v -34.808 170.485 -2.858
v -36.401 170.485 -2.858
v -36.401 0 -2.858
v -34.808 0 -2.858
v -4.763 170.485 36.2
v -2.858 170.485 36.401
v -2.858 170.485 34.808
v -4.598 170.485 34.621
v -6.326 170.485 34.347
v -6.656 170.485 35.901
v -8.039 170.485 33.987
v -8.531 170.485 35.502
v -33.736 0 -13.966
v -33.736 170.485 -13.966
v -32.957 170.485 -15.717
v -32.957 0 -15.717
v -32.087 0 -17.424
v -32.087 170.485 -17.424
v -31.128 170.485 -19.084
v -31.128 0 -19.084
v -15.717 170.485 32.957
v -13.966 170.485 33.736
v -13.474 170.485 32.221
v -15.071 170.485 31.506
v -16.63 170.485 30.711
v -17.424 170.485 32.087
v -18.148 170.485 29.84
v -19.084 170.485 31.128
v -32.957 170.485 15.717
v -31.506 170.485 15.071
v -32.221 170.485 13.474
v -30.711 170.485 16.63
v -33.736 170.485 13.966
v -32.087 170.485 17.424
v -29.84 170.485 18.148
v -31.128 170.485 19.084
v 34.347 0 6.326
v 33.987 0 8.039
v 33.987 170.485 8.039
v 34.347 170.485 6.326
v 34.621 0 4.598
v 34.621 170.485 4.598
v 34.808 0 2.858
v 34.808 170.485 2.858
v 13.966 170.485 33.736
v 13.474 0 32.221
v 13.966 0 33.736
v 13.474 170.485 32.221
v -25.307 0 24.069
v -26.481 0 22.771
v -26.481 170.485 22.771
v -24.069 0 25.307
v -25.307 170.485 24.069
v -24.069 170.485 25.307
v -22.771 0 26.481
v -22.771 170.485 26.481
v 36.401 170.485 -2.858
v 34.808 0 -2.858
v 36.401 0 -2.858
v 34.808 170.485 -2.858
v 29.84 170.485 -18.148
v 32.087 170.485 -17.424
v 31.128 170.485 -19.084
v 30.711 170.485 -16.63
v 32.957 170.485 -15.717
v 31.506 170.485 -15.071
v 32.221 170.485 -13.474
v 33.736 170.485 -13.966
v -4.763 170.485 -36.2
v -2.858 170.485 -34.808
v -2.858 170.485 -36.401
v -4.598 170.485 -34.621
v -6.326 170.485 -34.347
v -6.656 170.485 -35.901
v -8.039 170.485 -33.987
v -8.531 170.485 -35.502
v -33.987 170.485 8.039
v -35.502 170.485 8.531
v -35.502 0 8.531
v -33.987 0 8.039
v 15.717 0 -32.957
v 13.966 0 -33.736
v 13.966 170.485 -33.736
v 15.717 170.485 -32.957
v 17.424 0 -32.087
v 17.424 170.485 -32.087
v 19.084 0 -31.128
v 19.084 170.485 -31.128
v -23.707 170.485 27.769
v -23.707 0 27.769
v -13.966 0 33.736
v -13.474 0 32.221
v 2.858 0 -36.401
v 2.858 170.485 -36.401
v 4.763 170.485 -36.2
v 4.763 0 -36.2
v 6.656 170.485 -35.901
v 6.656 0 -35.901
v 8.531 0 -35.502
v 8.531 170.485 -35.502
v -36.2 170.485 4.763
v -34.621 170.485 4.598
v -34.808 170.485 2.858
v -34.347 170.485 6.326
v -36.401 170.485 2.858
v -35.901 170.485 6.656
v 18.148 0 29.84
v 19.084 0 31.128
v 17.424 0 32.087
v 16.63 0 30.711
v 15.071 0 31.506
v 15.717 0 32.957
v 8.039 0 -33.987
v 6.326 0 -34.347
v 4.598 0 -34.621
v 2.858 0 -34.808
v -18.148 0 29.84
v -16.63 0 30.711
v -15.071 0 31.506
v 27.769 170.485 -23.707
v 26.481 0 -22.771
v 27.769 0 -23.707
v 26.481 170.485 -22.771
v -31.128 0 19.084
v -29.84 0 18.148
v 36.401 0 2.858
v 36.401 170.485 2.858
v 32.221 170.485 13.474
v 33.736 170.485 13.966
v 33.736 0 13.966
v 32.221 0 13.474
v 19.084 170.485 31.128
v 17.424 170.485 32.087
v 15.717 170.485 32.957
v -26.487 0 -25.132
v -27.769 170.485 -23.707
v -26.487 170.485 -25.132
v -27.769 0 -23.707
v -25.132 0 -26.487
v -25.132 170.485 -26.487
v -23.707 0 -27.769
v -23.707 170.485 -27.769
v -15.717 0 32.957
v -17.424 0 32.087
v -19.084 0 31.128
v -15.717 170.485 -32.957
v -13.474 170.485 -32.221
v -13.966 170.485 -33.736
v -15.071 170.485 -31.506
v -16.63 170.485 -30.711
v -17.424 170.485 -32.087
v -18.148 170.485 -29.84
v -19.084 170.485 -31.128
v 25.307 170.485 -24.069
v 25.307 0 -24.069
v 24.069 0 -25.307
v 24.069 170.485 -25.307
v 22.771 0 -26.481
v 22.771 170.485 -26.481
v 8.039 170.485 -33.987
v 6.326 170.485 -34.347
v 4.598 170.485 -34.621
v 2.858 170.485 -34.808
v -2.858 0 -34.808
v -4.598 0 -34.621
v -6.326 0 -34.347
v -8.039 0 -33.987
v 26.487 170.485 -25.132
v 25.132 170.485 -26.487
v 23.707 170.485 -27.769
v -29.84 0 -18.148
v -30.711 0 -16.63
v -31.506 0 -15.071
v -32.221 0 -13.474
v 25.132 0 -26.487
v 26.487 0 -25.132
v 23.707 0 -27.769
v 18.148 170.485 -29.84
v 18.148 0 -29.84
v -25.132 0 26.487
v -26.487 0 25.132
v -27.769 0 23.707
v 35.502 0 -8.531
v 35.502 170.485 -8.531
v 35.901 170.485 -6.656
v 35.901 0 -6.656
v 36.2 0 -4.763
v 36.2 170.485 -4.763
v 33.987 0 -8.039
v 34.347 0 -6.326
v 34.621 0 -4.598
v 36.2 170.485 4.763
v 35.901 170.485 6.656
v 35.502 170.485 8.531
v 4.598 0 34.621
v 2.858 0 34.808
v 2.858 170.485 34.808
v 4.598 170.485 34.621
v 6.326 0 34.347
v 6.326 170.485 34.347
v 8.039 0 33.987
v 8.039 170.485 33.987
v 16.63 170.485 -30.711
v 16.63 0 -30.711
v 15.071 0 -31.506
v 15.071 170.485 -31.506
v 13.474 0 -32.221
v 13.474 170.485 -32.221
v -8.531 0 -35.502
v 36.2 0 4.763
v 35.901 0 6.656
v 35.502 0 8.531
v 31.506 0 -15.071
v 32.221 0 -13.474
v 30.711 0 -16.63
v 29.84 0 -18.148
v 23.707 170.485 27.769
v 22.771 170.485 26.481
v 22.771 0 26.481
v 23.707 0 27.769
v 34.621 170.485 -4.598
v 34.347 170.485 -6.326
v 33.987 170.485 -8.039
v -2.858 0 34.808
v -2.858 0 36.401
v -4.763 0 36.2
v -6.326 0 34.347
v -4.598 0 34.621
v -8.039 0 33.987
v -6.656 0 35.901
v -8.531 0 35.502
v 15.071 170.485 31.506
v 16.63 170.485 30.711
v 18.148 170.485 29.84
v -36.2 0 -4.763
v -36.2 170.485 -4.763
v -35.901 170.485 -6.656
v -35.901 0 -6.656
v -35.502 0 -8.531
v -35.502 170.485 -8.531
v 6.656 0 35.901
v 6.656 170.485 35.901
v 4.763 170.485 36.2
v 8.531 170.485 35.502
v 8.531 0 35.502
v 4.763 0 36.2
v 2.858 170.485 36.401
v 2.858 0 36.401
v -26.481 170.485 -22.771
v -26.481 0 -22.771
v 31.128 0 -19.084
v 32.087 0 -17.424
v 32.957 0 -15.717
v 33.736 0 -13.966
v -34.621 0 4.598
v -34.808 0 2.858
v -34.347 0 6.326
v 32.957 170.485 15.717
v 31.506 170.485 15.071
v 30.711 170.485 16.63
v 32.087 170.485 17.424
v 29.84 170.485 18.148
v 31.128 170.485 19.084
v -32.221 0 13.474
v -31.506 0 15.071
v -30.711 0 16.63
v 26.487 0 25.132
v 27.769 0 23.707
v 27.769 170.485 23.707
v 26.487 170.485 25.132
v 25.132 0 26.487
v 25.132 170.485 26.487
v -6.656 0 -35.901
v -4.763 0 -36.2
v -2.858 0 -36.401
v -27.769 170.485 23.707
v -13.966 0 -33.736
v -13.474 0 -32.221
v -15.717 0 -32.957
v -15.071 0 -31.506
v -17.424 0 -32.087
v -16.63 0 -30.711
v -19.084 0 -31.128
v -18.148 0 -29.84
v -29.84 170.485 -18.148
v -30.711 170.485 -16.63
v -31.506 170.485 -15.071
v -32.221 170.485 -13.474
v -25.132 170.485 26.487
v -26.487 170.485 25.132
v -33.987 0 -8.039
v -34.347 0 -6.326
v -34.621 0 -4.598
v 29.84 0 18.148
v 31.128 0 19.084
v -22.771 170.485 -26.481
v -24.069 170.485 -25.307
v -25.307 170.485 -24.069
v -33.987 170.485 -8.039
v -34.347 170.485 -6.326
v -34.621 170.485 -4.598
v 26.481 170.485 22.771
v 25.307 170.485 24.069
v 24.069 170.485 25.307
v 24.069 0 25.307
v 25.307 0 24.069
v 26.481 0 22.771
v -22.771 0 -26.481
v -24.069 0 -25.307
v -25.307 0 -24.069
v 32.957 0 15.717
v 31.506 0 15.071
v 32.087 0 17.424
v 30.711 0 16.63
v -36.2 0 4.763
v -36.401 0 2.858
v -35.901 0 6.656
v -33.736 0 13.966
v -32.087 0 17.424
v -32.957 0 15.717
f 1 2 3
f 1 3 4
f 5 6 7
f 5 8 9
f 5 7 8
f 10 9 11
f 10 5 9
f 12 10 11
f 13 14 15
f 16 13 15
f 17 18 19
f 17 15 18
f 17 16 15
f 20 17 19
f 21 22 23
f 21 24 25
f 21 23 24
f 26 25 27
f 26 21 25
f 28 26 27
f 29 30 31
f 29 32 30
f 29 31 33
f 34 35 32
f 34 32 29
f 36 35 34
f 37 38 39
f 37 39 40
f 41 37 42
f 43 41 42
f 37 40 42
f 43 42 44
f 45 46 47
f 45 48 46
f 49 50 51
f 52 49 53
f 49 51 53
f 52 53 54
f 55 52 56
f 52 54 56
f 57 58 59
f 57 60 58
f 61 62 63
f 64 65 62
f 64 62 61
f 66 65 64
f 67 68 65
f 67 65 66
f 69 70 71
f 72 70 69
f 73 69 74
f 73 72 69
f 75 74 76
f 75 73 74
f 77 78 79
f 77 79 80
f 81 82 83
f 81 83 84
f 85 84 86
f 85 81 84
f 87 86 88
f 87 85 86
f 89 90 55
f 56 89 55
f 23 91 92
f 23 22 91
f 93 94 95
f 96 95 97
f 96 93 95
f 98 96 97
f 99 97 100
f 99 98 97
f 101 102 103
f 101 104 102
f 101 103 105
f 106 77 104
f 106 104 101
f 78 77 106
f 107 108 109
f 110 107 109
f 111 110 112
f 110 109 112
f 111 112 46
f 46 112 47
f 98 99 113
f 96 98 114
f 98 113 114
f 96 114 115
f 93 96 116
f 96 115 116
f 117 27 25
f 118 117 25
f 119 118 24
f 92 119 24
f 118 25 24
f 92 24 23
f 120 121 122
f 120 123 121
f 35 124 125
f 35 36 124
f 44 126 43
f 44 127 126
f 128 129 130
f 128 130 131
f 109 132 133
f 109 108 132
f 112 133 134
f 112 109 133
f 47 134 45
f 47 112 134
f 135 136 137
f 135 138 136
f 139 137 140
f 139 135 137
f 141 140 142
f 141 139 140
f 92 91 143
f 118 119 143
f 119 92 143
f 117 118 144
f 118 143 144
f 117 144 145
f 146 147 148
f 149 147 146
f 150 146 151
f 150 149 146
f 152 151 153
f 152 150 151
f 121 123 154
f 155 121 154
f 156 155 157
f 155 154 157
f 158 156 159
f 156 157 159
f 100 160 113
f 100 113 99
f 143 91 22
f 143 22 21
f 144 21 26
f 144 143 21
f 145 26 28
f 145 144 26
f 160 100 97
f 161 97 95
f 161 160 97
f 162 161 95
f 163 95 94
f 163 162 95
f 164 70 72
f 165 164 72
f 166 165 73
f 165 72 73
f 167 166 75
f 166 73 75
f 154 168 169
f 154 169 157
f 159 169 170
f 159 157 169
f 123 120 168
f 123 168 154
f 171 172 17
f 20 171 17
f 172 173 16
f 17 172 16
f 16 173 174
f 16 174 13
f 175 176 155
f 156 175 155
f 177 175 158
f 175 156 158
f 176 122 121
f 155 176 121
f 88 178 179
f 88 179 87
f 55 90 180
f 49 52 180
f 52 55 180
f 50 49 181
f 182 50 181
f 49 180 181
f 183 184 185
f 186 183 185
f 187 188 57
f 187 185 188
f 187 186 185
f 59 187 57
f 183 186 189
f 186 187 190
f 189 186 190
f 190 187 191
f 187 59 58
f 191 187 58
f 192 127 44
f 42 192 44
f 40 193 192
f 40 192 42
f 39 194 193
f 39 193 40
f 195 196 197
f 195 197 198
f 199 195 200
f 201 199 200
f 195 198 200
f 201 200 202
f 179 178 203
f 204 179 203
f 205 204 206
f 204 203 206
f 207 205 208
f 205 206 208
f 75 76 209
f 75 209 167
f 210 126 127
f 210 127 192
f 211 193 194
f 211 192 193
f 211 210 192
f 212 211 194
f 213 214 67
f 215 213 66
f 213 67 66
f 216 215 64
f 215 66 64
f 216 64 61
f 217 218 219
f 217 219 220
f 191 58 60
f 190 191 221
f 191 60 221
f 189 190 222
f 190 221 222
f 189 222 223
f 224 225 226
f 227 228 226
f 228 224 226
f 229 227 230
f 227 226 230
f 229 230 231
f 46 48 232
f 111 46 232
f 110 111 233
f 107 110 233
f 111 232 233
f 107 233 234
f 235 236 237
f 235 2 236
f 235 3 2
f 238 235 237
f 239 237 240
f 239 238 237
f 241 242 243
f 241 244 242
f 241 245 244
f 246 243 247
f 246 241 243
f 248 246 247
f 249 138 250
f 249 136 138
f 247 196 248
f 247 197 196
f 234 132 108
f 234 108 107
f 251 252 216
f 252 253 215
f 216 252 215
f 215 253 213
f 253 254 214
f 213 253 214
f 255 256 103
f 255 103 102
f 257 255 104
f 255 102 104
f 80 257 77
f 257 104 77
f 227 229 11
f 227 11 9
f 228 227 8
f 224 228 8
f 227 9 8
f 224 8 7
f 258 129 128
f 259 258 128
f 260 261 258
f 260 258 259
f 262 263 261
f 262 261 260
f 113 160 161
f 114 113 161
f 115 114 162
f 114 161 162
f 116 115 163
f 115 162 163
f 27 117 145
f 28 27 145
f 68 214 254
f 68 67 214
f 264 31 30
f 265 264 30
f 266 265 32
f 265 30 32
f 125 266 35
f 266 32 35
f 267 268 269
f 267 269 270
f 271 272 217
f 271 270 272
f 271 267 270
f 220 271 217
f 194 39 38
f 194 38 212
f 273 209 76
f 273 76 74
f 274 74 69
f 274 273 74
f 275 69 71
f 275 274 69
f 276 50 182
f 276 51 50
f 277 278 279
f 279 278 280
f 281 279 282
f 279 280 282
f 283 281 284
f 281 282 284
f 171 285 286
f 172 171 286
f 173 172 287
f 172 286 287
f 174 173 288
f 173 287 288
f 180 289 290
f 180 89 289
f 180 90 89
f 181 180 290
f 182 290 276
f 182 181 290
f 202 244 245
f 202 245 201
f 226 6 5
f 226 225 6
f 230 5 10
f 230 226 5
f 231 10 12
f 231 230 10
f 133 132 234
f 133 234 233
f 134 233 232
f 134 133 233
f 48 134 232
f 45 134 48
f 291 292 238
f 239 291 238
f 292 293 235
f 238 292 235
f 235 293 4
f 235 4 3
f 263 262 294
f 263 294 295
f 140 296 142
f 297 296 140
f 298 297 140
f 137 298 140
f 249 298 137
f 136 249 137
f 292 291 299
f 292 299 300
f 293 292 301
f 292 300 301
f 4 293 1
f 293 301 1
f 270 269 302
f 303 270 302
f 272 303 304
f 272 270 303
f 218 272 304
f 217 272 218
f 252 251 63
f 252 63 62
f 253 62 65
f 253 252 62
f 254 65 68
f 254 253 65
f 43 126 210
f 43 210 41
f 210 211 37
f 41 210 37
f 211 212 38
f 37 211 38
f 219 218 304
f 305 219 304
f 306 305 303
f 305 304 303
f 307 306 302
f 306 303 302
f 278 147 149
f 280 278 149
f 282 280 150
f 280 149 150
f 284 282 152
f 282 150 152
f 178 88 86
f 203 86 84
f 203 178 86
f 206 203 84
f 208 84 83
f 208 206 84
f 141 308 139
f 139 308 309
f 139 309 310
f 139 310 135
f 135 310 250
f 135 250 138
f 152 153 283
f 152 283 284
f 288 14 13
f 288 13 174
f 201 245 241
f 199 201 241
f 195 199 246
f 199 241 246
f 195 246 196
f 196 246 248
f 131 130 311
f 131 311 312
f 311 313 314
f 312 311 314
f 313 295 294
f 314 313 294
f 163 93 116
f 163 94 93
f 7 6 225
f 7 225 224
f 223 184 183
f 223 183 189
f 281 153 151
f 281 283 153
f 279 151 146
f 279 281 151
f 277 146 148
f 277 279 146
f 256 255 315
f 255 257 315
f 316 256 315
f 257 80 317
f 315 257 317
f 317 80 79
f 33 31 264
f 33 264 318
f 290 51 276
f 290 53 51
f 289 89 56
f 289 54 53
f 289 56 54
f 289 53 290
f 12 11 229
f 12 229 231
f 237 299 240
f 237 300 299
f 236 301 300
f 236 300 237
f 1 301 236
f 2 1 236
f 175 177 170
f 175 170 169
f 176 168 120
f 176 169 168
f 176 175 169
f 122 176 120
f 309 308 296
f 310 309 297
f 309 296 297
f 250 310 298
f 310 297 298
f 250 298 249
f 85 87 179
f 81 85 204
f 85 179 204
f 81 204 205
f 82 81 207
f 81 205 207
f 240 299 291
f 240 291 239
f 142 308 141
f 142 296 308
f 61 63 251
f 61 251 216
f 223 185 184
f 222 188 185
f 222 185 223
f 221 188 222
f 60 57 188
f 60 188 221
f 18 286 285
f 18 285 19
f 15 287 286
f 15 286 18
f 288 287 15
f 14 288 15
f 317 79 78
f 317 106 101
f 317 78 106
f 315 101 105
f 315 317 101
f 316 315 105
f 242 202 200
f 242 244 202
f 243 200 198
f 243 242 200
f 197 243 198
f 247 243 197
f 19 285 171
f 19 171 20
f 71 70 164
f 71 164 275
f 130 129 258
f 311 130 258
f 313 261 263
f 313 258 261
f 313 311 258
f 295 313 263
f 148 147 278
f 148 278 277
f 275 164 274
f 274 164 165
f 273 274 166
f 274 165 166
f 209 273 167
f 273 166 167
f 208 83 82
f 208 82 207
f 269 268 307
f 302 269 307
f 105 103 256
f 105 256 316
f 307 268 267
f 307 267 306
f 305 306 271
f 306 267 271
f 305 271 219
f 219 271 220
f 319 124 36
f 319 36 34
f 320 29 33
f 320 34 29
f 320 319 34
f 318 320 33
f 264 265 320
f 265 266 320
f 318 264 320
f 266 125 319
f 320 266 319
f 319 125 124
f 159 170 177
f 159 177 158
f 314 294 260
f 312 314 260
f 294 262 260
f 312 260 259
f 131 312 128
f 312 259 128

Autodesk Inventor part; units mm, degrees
ref_plane "YZ Plane" through (0, 0, 0) normal (1, 0, 0) x (0, 1, 0)
ref_plane "XZ Plane" through (0, 0, 0) normal (0, 1, 0) x (-1, 0, 0)
ref_plane "XY Plane" through (0, 0, 0) normal (0, 0, 1) x (1, 0, 0)
sketch "Sketch1" plane through (0, 0, 0) normal (0, 1, 0) x (-1, 0, 0)
  circle A0 centre (0, 0) radius 36.5125
  dimension "d0" = 73.025
extrude "Extrusion1" add sketch "Sketch1" along normal blind 170.4848
sketch "Sketch2" plane through (0, 170.4848, 0) normal (0, 1, 0) x (1, 0, 0)
  circle A0 centre (0, 0) radius 34.925
  dimension "d3" = 69.85
extrude "Extrusion2" cut sketch "Sketch2" against normal through all
sketch "Sketch3" plane through (0, 170.4848, 0) normal (0, 1, 0) x (1, 0, 0)
  line L0 (-31.75, -2.8575) -> (-37.465, -2.8575)
  line L1 (-37.465, -2.8575) -> (-37.465, 2.8575)
  line L2 (-37.465, 2.8575) -> (-31.75, 2.8575)
  line L3 (-31.75, 2.8575) -> (-31.75, -2.8575)
  circle A0 centre (0, 0) radius 36.5125 projected
  line L4 (-29.313, -12.5289) -> (-34.7483, -14.295)
  line L5 (-34.7483, -14.295) -> (-36.5143, -8.8597)
  line L6 (-36.5143, -8.8597) -> (-31.0791, -7.0936)
  line L7 (-31.0791, -7.0936) -> (-29.313, -12.5289)
  line L8 (-24.0067, -20.9739) -> (-28.6302, -24.3331)
  line L9 (-28.6302, -24.3331) -> (-31.9894, -19.7096)
  line L10 (-31.9894, -19.7096) -> (-27.3659, -16.3504)
  line L11 (-27.3659, -16.3504) -> (-24.0067, -20.9739)
  line L12 (-16.3504, -27.3659) -> (-19.7096, -31.9894)
  line L13 (-19.7096, -31.9894) -> (-24.3331, -28.6302)
  line L14 (-24.3331, -28.6302) -> (-20.9739, -24.0067)
  line L15 (-20.9739, -24.0067) -> (-16.3504, -27.3659)
  line L16 (-7.0936, -31.0791) -> (-8.8597, -36.5143)
  line L17 (-8.8597, -36.5143) -> (-14.295, -34.7483)
  line L18 (-14.295, -34.7483) -> (-12.5289, -29.313)
  line L19 (-12.5289, -29.313) -> (-7.0936, -31.0791)
  line L20 (2.8575, -31.75) -> (2.8575, -37.465)
  line L21 (2.8575, -37.465) -> (-2.8575, -37.465)
  line L22 (-2.8575, -37.465) -> (-2.8575, -31.75)
  line L23 (-2.8575, -31.75) -> (2.8575, -31.75)
  line L24 (12.5289, -29.313) -> (14.295, -34.7483)
  line L25 (14.295, -34.7483) -> (8.8597, -36.5143)
  line L26 (8.8597, -36.5143) -> (7.0936, -31.0791)
  line L27 (7.0936, -31.0791) -> (12.5289, -29.313)
  line L28 (20.9739, -24.0067) -> (24.3331, -28.6302)
  line L29 (24.3331, -28.6302) -> (19.7096, -31.9894)
  line L30 (19.7096, -31.9894) -> (16.3504, -27.3659)
  line L31 (16.3504, -27.3659) -> (20.9739, -24.0067)
  line L32 (27.3659, -16.3504) -> (31.9894, -19.7096)
  line L33 (31.9894, -19.7096) -> (28.6302, -24.3331)
  line L34 (28.6302, -24.3331) -> (24.0067, -20.9739)
  line L35 (24.0067, -20.9739) -> (27.3659, -16.3504)
  line L36 (31.0791, -7.0936) -> (36.5143, -8.8597)
  line L37 (36.5143, -8.8597) -> (34.7483, -14.295)
  line L38 (34.7483, -14.295) -> (29.313, -12.5289)
  line L39 (29.313, -12.5289) -> (31.0791, -7.0936)
  line L40 (31.75, 2.8575) -> (37.465, 2.8575)
  line L41 (37.465, 2.8575) -> (37.465, -2.8575)
  line L42 (37.465, -2.8575) -> (31.75, -2.8575)
  line L43 (31.75, -2.8575) -> (31.75, 2.8575)
  line L44 (29.313, 12.5289) -> (34.7483, 14.295)
  line L45 (34.7483, 14.295) -> (36.5143, 8.8597)
  line L46 (36.5143, 8.8597) -> (31.0791, 7.0936)
  line L47 (31.0791, 7.0936) -> (29.313, 12.5289)
  line L48 (24.0067, 20.9739) -> (28.6302, 24.3331)
  line L49 (28.6302, 24.3331) -> (31.9894, 19.7096)
  line L50 (31.9894, 19.7096) -> (27.3659, 16.3504)
  line L51 (27.3659, 16.3504) -> (24.0067, 20.9739)
  line L52 (16.3504, 27.3659) -> (19.7096, 31.9894)
  line L53 (19.7096, 31.9894) -> (24.3331, 28.6302)
  line L54 (24.3331, 28.6302) -> (20.9739, 24.0067)
  line L55 (20.9739, 24.0067) -> (16.3504, 27.3659)
  line L56 (7.0936, 31.0791) -> (8.8597, 36.5143)
  line L57 (8.8597, 36.5143) -> (14.295, 34.7483)
  line L58 (14.295, 34.7483) -> (12.5289, 29.313)
  line L59 (12.5289, 29.313) -> (7.0936, 31.0791)
  line L60 (-2.8575, 31.75) -> (-2.8575, 37.465)
  line L61 (-2.8575, 37.465) -> (2.8575, 37.465)
  line L62 (2.8575, 37.465) -> (2.8575, 31.75)
  line L63 (2.8575, 31.75) -> (-2.8575, 31.75)
  line L64 (-12.5289, 29.313) -> (-14.295, 34.7483)
  line L65 (-14.295, 34.7483) -> (-8.8597, 36.5143)
  line L66 (-8.8597, 36.5143) -> (-7.0936, 31.0791)
  line L67 (-7.0936, 31.0791) -> (-12.5289, 29.313)
  line L68 (-20.9739, 24.0067) -> (-24.3331, 28.6302)
  line L69 (-24.3331, 28.6302) -> (-19.7096, 31.9894)
  line L70 (-19.7096, 31.9894) -> (-16.3504, 27.3659)
  line L71 (-16.3504, 27.3659) -> (-20.9739, 24.0067)
  line L72 (-27.3659, 16.3504) -> (-31.9894, 19.7096)
  line L73 (-31.9894, 19.7096) -> (-28.6302, 24.3331)
  line L74 (-28.6302, 24.3331) -> (-24.0067, 20.9739)
  line L75 (-24.0067, 20.9739) -> (-27.3659, 16.3504)
  line L76 (-31.0791, 7.0936) -> (-36.5143, 8.8597)
  line L77 (-36.5143, 8.8597) -> (-34.7483, 14.295)
  line L78 (-34.7483, 14.295) -> (-29.313, 12.5289)
  line L79 (-29.313, 12.5289) -> (-31.0791, 7.0936)
  circle A1 centre (0, 0) radius 34.925 projected
  point P0 (-36.5125, 0)
  point P1 (-34.7255, -11.283)
  point P2 (-29.5392, -21.4615)
  point P3 (-21.4615, -29.5392)
  point P4 (-11.283, -34.7255)
  point P5 (0, -36.5125)
  point P6 (11.283, -34.7255)
  point P7 (21.4615, -29.5392)
  point P8 (29.5392, -21.4615)
  point P9 (34.7255, -11.283)
  point P10 (36.5125, 0)
  point P11 (34.7255, 11.283)
  point P12 (29.5392, 21.4615)
  point P13 (21.4615, 29.5392)
  point P14 (11.283, 34.7255)
  point P15 (0, 36.5125)
  point P16 (-11.283, 34.7255)
  point P17 (-21.4615, 29.5392)
  point P18 (-29.5392, 21.4615)
  point P19 (-34.7255, 11.283)
  dimension "d6" = 5.715
  dimension "d7" = 5.715
  dimension "d8" = 2.8575
  dimension "d13" = 360
  dimension "d15" = 2.54
extrude "Extrusion3" cut sketch "Sketch3" against normal through all contours L0 A1 L2 L3 | L0 A0 L2 A1 | L0 L1 L2 A0 | A1 L4 A0 L6 | L6 L7 L4 A1 | A0 L4 L5 L6 | A1 L78 L79 L76 | L76 A0 L78 A1 | L76 L77 L78 A0 | A1 L8 A0 L10 | L10 L11 L8 A1 | A0 L8 L9 L10 | A1 L74 L75 L72 | L72 A0 L74 A1 | L72 L73 L74 A0 | A1 L12 A0 L14 | L14 L15 L12 A1 | A0 L12 L13 L14 | A1 L70 L71 L68 | L68 A0 L70 A1 | L68 L69 L70 A0 | A1 L16 A0 L18 | L18 L19 L16 A1 | A0 L16 L17 L18 | A1 L66 L67 L64 | L64 A0 L66 A1 | L64 L65 L66 A0 | A1 L20 A0 L22 | L22 L23 L20 A1 | A0 L20 L21 L22 | A1 L62 L63 L60 | L60 A0 L62 A1 | L60 L61 L62 A0 | A1 L24 A0 L26 | L26 L27 L24 A1 | A0 L24 L25 L26 | A1 L58 L59 L56 | L56 A0 L58 A1 | L56 L57 L58 A0 | A1 L28 A0 L30 | L30 L31 L28 A1 | A0 L28 L29 L30 | A1 L54 L55 L52 | L52 A0 L54 A1 | L52 L53 L54 A0 | A1 L32 A0 L34 | L34 L35 L32 A1 | A0 L32 L33 L34 | A1 L50 L51 L48 | L48 A0 L50 A1 | L48 L49 L50 A0 | A1 L36 A0 L38 | L38 L39 L36 A1 | A0 L36 L37 L38 | A1 L46 L47 L44 | L44 A0 L46 A1 | L44 L45 L46 A0 | A1 L40 A0 L42 | L42 L43 L40 A1 | A0 L40 L41 L42
properties part number "bandsmidroller"
